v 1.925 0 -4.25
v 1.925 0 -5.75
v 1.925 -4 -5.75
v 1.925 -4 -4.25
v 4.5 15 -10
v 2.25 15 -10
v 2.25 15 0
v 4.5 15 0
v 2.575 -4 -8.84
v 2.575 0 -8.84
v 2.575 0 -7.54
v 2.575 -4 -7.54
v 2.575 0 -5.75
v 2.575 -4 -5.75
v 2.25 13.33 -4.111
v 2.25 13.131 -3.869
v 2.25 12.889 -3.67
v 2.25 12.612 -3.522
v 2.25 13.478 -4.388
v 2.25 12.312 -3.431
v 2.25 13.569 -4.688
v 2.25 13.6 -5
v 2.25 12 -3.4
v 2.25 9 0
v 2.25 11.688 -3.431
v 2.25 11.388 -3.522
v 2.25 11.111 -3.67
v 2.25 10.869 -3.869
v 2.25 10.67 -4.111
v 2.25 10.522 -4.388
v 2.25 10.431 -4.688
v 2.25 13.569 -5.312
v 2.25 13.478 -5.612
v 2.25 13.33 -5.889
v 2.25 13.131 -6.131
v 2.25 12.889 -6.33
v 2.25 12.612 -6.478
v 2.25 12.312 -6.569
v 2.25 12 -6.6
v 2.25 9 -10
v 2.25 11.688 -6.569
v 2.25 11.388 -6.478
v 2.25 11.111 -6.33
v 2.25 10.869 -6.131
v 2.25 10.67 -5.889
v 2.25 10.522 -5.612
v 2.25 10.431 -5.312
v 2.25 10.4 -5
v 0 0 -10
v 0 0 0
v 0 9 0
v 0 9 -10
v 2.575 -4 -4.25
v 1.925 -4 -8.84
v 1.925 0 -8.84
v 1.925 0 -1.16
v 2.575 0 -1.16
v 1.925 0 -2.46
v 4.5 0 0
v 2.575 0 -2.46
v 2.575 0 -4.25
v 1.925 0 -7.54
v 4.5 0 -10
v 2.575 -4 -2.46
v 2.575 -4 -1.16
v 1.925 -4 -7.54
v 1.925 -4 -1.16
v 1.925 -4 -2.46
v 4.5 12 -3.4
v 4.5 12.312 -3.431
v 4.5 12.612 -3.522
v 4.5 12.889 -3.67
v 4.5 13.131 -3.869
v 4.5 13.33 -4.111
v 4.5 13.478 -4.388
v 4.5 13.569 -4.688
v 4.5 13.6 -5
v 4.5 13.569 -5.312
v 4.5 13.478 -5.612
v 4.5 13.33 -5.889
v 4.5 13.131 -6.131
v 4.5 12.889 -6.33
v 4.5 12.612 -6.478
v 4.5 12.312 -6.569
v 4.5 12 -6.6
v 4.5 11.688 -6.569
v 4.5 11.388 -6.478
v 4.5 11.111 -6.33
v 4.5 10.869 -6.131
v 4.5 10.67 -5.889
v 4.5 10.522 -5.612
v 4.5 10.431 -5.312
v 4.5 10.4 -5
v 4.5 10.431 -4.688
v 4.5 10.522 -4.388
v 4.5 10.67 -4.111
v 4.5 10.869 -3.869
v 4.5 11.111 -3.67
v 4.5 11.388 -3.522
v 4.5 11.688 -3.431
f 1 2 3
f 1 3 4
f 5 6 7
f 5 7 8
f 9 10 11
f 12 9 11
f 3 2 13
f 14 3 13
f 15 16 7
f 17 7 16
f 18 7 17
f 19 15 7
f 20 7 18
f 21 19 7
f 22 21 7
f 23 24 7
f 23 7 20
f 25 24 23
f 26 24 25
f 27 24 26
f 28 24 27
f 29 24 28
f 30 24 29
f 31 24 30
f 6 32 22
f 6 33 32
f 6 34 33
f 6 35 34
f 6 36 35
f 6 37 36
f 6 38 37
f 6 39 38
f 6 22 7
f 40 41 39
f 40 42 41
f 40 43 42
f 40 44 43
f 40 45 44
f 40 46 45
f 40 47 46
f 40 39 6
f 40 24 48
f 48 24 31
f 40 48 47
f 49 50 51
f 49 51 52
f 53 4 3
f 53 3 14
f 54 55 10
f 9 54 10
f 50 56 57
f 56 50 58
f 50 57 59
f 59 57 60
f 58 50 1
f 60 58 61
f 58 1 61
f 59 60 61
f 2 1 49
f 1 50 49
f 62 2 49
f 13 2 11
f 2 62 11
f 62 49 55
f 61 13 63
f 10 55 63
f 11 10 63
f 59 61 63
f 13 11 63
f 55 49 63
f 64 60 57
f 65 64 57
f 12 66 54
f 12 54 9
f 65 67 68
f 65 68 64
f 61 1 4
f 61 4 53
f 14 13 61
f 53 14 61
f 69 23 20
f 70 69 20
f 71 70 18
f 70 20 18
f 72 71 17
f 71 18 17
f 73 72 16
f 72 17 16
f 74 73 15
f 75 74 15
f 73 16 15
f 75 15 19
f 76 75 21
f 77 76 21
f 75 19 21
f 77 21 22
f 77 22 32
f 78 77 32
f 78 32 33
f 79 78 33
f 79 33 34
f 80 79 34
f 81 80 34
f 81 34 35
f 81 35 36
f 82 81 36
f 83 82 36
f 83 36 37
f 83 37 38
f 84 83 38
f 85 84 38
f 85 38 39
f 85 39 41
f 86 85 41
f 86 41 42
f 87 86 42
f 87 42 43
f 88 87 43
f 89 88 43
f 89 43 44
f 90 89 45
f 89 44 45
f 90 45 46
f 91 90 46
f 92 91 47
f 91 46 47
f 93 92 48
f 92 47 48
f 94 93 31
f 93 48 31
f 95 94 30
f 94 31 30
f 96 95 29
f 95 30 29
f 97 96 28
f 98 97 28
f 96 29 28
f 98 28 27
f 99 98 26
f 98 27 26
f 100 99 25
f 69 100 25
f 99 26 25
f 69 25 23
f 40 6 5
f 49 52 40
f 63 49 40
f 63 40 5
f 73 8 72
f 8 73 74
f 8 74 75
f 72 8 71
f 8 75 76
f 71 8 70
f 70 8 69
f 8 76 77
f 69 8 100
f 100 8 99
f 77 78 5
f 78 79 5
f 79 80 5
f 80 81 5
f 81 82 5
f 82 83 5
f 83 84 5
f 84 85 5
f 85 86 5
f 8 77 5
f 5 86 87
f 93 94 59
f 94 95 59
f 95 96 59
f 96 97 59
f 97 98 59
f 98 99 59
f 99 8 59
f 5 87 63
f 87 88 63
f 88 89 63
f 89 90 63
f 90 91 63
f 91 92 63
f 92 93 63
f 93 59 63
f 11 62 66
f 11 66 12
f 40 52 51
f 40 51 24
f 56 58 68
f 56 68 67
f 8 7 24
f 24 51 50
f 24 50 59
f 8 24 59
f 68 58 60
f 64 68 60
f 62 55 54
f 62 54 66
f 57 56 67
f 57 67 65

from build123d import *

# Parameters (mm, degrees)
SKETCH_1_W          = 4.5
SKETCH_1_H          = 10
EXTRUDE_1_DEPTH     = 9
SKETCH_2_W          = 2.25
SKETCH_2_H          = 10
EXTRUDE_2_DEPTH     = 6
SKETCH_3_R          = 1.6
CUT_EXTRUDE_1_DEPTH = 19.167622299
SKETCH_4_W          = 0.65
SKETCH_4_H          = 1.3
SKETCH_4_H_2        = 1.5
EXTRUDE_3_DEPTH     = 4


with BuildPart() as part:
    # Эскиз1 → Бобышка-Вытянуть1 (new body)
    with BuildSketch(Plane(origin=(0, 0, 0), x_dir=(1, 0, 0), z_dir=(0, 1, 0))):
        with Locations((2.25, 5)):
            Rectangle(SKETCH_1_W, SKETCH_1_H)
    extrude(amount=EXTRUDE_1_DEPTH)

    # Эскиз2 → Бобышка-Вытянуть2 (add)
    with BuildSketch(Plane(origin=(0, 9, 0), x_dir=(1, 0, 0), z_dir=(0, 1, 0))):
        with Locations((3.375, 5)):
            Rectangle(SKETCH_2_W, SKETCH_2_H)
    extrude(amount=EXTRUDE_2_DEPTH)

    # Эскиз3 → Вырез-Вытянуть1 (cut, through all)
    with BuildSketch(Plane.ZY.offset(-2.25)):
        with Locations((-5, 12)):
            Circle(SKETCH_3_R)
    extrude(amount=-CUT_EXTRUDE_1_DEPTH, mode=Mode.SUBTRACT)

    # Эскиз4 → Бобышка-Вытянуть3 (add)
    with BuildSketch(Plane.XZ):
        with Locations((2.25, -1.81)):
            Rectangle(SKETCH_4_W, SKETCH_4_H)
        with Locations((2.25, -5)):
            Rectangle(SKETCH_4_W, SKETCH_4_H_2)
        with Locations((2.25, -8.19)):
            Rectangle(SKETCH_4_W, SKETCH_4_H)
    extrude(amount=EXTRUDE_3_DEPTH)


solid = part.part
